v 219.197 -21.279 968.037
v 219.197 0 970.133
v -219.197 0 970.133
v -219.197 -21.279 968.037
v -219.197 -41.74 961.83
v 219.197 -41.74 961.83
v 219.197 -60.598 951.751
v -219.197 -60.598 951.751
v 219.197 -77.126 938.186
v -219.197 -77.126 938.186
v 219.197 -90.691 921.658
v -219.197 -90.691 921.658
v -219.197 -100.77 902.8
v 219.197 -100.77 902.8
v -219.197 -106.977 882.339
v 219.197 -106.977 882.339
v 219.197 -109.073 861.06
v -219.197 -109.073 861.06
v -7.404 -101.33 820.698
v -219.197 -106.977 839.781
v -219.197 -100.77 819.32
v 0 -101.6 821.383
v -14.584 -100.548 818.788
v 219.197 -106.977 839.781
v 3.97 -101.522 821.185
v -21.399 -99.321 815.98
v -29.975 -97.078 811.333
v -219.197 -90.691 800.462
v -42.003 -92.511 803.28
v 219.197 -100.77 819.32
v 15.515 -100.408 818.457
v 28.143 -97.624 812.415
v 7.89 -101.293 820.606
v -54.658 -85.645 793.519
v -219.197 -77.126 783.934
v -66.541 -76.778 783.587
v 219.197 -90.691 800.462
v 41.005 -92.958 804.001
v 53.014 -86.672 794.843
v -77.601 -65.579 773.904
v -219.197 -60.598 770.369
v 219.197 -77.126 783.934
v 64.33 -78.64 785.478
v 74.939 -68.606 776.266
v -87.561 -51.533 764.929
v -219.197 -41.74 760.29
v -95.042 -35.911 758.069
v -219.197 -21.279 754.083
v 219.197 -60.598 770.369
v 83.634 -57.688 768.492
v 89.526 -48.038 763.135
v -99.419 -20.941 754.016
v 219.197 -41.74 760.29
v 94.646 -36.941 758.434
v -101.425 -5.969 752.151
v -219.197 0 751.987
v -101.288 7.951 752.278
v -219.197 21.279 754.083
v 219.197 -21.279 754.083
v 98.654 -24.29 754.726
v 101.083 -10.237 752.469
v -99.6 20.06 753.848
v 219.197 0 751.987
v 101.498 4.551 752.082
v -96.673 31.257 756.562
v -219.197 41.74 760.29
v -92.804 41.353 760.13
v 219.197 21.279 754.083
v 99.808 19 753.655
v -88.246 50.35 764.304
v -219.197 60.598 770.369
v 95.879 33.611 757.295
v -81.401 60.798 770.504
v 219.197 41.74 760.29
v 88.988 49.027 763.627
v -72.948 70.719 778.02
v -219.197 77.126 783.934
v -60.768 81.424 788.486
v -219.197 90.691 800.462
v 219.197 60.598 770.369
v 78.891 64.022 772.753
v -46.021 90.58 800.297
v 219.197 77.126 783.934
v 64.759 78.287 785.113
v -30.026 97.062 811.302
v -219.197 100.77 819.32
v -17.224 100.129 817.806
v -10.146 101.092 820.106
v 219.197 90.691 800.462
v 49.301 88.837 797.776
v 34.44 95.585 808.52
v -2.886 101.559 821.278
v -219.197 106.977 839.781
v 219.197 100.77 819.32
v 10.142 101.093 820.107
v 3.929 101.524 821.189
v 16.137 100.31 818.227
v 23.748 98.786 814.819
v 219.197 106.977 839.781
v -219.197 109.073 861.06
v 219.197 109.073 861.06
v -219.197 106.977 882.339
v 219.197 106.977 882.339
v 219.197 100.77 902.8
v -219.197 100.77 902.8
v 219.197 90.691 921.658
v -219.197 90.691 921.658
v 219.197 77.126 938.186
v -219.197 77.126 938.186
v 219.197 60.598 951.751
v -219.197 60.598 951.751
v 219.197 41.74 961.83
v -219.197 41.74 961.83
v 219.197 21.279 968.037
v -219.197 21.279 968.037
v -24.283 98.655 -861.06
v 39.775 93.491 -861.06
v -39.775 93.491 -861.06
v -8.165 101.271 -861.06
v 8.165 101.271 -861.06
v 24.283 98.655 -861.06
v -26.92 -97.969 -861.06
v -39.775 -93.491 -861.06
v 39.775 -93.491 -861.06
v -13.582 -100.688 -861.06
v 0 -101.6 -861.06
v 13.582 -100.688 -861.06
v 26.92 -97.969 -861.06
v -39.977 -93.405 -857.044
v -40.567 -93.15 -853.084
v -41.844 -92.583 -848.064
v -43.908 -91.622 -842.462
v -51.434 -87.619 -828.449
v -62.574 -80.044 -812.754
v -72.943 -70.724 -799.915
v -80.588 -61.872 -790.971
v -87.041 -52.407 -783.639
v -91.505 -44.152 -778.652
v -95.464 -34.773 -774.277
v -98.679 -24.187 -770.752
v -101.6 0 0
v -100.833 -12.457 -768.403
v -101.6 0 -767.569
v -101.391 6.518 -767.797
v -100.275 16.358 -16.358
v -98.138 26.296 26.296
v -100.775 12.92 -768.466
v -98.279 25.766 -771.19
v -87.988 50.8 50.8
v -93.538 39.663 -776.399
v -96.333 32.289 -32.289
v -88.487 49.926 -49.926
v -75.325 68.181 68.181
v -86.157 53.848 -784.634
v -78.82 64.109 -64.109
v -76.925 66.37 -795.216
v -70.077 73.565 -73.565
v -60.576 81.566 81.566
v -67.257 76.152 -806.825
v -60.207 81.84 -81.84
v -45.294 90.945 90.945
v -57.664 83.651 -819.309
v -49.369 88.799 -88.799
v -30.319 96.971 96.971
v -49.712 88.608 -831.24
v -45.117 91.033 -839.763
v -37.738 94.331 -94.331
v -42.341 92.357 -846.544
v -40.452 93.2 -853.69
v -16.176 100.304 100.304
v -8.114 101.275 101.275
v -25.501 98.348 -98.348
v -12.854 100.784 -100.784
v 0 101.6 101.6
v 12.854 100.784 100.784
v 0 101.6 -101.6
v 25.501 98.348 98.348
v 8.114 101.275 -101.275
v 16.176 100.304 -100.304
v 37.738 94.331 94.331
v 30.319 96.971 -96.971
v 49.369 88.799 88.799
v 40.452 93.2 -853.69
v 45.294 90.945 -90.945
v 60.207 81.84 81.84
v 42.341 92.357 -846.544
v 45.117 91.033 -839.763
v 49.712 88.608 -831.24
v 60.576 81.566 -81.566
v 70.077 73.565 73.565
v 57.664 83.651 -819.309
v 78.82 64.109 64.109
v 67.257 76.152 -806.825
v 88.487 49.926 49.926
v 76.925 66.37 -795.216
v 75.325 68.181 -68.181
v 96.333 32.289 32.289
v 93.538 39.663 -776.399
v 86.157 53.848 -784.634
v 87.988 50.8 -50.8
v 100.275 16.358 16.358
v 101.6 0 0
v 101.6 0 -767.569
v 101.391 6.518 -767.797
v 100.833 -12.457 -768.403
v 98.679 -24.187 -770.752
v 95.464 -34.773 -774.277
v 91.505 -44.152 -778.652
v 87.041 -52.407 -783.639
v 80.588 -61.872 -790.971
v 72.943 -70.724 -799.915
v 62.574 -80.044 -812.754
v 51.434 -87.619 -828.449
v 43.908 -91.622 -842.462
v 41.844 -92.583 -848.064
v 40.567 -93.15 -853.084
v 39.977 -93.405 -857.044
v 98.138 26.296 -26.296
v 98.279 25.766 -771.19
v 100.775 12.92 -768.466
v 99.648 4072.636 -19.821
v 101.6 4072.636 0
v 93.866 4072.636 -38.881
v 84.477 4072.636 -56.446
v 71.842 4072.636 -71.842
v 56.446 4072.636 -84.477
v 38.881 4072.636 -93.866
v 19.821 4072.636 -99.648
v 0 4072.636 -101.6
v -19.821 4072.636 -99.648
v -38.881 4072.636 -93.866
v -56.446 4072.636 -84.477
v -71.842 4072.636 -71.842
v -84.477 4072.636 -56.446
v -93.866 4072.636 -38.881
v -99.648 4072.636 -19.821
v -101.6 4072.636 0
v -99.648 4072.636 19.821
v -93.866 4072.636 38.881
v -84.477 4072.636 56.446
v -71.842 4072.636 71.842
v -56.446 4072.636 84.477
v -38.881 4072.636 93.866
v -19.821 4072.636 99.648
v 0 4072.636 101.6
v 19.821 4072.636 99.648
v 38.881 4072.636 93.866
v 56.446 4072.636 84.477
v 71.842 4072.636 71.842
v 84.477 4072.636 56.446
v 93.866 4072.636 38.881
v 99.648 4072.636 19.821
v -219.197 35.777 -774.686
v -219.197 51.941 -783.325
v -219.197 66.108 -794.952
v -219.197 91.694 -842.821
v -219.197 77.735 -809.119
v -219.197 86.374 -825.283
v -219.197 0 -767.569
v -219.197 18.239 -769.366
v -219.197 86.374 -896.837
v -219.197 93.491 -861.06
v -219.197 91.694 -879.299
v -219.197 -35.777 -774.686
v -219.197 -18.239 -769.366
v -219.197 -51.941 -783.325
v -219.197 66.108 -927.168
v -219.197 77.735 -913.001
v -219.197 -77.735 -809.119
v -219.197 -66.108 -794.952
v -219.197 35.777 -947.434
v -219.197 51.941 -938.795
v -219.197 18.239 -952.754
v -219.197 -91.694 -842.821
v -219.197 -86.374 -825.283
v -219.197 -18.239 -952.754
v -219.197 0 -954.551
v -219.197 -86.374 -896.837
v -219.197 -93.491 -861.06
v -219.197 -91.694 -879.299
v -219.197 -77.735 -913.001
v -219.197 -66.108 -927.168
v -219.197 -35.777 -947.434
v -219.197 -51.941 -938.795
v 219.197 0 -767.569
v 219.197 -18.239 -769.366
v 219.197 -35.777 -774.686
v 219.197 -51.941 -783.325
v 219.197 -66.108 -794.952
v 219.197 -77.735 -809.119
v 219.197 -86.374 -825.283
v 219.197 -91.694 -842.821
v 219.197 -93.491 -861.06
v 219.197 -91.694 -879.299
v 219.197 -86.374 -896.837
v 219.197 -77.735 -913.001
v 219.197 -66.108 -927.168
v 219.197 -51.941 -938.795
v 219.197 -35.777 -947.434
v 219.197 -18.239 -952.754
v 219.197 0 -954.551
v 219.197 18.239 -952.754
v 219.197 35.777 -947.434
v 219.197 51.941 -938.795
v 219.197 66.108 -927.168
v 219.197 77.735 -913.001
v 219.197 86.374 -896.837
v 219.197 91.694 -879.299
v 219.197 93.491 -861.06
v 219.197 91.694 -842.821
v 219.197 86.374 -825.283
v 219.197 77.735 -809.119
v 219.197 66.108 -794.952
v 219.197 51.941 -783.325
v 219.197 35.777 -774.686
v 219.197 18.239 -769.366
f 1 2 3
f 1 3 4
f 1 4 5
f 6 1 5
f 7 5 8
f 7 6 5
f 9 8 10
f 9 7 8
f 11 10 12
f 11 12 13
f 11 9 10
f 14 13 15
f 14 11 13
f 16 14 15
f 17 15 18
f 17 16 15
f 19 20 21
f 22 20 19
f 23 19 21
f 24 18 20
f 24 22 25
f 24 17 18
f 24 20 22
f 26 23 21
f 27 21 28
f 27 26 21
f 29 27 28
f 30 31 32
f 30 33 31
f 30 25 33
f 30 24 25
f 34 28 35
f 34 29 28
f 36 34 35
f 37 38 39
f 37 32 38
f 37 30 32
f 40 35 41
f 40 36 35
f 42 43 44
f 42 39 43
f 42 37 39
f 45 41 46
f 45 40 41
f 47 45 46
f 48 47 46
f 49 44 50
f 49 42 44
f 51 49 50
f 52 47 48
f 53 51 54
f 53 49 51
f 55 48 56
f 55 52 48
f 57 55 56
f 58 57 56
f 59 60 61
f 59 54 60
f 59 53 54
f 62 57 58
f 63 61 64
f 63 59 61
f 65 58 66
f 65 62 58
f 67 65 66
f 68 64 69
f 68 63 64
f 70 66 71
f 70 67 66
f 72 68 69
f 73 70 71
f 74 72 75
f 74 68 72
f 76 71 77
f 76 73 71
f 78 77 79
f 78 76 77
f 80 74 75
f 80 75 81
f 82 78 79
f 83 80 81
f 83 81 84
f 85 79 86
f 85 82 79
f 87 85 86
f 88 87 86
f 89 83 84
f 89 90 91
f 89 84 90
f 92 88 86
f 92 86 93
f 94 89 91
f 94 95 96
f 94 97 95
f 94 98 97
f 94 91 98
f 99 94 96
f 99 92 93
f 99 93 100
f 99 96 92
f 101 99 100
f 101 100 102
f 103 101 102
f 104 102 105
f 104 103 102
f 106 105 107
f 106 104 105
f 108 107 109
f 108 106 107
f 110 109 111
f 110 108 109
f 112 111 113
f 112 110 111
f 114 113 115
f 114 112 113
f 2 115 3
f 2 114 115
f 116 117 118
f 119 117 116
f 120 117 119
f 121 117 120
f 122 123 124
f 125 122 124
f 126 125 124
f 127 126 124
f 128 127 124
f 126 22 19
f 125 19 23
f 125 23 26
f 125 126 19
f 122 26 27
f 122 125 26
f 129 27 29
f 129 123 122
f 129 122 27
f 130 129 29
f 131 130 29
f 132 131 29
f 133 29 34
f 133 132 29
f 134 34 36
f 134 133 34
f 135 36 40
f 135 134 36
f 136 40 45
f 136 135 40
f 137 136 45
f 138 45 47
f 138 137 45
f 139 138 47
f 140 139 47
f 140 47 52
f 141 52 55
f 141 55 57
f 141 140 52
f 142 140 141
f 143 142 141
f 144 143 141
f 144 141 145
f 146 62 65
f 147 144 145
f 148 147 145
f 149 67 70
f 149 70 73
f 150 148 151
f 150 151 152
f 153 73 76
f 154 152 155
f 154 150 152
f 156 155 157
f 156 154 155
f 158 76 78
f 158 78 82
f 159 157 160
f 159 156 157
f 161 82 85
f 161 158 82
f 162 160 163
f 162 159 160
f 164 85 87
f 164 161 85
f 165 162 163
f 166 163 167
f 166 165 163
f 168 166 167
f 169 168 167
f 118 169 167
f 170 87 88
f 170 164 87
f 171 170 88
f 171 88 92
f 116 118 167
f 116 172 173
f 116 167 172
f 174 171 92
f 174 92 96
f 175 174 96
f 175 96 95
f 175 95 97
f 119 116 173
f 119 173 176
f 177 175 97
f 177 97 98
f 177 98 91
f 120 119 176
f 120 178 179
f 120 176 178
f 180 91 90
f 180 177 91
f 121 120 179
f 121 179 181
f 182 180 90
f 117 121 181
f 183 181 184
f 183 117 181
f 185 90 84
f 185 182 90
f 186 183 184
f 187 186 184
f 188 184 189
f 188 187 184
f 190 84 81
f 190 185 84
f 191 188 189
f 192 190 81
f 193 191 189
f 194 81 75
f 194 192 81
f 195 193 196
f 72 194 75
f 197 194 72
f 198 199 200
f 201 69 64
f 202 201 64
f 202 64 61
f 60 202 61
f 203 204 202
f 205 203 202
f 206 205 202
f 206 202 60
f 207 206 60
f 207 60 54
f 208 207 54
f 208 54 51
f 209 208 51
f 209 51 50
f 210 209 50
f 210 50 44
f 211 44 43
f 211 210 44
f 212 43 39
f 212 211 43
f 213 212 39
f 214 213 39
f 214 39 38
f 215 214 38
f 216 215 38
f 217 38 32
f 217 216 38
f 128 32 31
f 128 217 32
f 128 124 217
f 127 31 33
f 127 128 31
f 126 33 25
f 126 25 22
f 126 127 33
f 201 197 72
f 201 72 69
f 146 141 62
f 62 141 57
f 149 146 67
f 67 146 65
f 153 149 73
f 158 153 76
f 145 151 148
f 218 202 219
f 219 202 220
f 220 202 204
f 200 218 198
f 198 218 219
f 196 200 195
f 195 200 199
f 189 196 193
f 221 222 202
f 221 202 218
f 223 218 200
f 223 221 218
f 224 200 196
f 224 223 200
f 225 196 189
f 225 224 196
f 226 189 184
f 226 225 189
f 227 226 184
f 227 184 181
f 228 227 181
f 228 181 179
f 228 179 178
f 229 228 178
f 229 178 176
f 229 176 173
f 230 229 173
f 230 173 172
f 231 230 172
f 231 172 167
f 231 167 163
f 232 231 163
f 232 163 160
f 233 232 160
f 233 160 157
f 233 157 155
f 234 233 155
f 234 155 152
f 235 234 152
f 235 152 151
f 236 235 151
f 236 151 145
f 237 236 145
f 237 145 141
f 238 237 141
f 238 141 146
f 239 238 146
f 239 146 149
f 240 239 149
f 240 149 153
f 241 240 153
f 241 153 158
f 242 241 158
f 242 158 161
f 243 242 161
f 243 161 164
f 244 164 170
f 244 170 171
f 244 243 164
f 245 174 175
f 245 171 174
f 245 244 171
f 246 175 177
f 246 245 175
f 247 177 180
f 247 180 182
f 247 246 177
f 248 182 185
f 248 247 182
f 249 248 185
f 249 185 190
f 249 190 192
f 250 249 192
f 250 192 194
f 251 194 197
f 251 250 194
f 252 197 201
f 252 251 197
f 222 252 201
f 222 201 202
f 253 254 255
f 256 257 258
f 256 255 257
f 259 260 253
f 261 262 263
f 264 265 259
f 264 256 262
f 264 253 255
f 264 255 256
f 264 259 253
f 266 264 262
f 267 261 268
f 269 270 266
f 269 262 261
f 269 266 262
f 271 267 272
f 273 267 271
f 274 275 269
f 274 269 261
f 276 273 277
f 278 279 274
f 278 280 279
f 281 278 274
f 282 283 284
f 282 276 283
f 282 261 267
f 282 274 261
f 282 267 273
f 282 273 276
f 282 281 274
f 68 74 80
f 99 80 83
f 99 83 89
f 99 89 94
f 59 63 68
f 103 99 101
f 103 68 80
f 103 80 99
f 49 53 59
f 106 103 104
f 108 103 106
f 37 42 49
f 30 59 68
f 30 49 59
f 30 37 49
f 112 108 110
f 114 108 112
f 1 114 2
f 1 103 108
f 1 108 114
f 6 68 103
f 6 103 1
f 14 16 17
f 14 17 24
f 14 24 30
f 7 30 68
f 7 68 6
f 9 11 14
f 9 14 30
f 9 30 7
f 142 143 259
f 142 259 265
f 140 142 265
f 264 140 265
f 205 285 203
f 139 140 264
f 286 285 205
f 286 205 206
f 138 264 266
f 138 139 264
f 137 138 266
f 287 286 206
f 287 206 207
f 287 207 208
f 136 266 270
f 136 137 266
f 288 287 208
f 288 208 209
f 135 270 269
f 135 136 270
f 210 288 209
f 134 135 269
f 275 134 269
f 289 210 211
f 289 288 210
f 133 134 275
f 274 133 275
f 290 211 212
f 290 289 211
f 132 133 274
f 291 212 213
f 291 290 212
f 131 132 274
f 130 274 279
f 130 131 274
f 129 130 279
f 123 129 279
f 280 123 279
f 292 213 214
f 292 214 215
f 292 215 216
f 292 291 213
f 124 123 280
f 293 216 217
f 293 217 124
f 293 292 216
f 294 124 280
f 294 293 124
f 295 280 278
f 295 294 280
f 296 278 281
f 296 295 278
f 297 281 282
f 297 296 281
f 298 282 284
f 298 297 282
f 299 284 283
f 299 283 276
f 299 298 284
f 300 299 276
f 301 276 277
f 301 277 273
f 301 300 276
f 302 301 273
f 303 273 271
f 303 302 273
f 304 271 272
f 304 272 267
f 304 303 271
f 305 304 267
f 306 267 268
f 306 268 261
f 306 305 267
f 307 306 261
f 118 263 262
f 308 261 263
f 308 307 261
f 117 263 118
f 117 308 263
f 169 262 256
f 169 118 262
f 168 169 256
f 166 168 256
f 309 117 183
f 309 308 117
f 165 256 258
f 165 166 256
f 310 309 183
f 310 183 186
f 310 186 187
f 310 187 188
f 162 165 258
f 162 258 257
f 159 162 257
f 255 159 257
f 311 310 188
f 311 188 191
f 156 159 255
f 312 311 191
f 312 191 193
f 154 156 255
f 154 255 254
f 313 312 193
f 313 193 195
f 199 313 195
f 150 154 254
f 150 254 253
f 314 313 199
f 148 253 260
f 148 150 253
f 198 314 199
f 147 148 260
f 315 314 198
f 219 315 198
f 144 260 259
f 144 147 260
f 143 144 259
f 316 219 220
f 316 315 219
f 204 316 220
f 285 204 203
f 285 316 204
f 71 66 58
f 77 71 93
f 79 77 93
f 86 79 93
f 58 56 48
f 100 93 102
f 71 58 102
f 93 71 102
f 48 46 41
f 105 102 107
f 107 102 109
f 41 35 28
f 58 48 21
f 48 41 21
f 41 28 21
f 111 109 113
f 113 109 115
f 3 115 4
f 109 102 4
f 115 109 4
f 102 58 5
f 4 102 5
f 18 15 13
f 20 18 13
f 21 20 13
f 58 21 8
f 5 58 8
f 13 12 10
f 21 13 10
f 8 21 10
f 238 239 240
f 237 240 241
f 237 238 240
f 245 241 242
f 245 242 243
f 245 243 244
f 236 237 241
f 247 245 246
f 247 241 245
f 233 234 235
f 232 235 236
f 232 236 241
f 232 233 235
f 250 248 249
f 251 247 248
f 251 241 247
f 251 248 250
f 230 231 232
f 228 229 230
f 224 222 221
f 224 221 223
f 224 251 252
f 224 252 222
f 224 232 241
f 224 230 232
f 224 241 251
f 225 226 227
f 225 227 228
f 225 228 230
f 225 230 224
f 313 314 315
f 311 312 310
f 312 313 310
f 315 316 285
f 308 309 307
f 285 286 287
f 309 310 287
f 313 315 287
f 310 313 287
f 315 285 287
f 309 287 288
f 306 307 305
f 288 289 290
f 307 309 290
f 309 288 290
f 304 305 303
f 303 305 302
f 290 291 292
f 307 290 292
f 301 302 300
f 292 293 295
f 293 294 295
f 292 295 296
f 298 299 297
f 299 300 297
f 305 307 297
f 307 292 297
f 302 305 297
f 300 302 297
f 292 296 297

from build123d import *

# Parameters (mm, degrees)
SKETCH1_W   = 101.6
SKETCH1_H   = 4072.636
SKETCH2_W   = 1722.12
SKETCH2_H   = 101.6
SKETCH3_W   = 438.393418328
SKETCH3_H   = 93.490817115
SKETCH3_4_W = 438.393418328
SKETCH3_4_H = 109.072619968


with BuildPart() as part:
    # Sketch1 → Revolve3 (revolve)
    with BuildSketch(Plane.XY):
        with Locations((-50.8, 2036.318)):
            Rectangle(SKETCH1_W, SKETCH1_H)
    revolve(axis=Axis((0, 0, 0), (0, 1, 0)))

    # Sketch2 → Revolve4 (revolve)
    with BuildSketch(Plane(origin=(0, 0, 0), x_dir=(0, 0, -1), z_dir=(1, 0, 0))):
        with Locations((0, 50.8)):
            Rectangle(SKETCH2_W, SKETCH2_H)
    revolve(axis=Axis((0, 0, 861.06), (0, 0, -1)))

    # Sketch3 → Revolve7 (revolve)
    with BuildSketch(Plane(origin=(0, 0, 0), x_dir=(1, 0, 0), z_dir=(0, 1, 0))):
        with Locations((0, 907.805408558)):
            Rectangle(SKETCH3_W, SKETCH3_H)
    revolve(axis=Axis((-219.196709164, 0, -861.06), (1, 0, 0)))

    # Sketch3<4> → Revolve9 (revolve)
    with BuildSketch(Plane(origin=(0, 0, 0), x_dir=(1, 0, 0), z_dir=(0, 1, 0))):
        with Locations((0, -915.596309984)):
            Rectangle(SKETCH3_4_W, SKETCH3_4_H)
    revolve(axis=Axis((-219.196709164, 0, 861.06), (1, 0, 0)))


solid = part.part
